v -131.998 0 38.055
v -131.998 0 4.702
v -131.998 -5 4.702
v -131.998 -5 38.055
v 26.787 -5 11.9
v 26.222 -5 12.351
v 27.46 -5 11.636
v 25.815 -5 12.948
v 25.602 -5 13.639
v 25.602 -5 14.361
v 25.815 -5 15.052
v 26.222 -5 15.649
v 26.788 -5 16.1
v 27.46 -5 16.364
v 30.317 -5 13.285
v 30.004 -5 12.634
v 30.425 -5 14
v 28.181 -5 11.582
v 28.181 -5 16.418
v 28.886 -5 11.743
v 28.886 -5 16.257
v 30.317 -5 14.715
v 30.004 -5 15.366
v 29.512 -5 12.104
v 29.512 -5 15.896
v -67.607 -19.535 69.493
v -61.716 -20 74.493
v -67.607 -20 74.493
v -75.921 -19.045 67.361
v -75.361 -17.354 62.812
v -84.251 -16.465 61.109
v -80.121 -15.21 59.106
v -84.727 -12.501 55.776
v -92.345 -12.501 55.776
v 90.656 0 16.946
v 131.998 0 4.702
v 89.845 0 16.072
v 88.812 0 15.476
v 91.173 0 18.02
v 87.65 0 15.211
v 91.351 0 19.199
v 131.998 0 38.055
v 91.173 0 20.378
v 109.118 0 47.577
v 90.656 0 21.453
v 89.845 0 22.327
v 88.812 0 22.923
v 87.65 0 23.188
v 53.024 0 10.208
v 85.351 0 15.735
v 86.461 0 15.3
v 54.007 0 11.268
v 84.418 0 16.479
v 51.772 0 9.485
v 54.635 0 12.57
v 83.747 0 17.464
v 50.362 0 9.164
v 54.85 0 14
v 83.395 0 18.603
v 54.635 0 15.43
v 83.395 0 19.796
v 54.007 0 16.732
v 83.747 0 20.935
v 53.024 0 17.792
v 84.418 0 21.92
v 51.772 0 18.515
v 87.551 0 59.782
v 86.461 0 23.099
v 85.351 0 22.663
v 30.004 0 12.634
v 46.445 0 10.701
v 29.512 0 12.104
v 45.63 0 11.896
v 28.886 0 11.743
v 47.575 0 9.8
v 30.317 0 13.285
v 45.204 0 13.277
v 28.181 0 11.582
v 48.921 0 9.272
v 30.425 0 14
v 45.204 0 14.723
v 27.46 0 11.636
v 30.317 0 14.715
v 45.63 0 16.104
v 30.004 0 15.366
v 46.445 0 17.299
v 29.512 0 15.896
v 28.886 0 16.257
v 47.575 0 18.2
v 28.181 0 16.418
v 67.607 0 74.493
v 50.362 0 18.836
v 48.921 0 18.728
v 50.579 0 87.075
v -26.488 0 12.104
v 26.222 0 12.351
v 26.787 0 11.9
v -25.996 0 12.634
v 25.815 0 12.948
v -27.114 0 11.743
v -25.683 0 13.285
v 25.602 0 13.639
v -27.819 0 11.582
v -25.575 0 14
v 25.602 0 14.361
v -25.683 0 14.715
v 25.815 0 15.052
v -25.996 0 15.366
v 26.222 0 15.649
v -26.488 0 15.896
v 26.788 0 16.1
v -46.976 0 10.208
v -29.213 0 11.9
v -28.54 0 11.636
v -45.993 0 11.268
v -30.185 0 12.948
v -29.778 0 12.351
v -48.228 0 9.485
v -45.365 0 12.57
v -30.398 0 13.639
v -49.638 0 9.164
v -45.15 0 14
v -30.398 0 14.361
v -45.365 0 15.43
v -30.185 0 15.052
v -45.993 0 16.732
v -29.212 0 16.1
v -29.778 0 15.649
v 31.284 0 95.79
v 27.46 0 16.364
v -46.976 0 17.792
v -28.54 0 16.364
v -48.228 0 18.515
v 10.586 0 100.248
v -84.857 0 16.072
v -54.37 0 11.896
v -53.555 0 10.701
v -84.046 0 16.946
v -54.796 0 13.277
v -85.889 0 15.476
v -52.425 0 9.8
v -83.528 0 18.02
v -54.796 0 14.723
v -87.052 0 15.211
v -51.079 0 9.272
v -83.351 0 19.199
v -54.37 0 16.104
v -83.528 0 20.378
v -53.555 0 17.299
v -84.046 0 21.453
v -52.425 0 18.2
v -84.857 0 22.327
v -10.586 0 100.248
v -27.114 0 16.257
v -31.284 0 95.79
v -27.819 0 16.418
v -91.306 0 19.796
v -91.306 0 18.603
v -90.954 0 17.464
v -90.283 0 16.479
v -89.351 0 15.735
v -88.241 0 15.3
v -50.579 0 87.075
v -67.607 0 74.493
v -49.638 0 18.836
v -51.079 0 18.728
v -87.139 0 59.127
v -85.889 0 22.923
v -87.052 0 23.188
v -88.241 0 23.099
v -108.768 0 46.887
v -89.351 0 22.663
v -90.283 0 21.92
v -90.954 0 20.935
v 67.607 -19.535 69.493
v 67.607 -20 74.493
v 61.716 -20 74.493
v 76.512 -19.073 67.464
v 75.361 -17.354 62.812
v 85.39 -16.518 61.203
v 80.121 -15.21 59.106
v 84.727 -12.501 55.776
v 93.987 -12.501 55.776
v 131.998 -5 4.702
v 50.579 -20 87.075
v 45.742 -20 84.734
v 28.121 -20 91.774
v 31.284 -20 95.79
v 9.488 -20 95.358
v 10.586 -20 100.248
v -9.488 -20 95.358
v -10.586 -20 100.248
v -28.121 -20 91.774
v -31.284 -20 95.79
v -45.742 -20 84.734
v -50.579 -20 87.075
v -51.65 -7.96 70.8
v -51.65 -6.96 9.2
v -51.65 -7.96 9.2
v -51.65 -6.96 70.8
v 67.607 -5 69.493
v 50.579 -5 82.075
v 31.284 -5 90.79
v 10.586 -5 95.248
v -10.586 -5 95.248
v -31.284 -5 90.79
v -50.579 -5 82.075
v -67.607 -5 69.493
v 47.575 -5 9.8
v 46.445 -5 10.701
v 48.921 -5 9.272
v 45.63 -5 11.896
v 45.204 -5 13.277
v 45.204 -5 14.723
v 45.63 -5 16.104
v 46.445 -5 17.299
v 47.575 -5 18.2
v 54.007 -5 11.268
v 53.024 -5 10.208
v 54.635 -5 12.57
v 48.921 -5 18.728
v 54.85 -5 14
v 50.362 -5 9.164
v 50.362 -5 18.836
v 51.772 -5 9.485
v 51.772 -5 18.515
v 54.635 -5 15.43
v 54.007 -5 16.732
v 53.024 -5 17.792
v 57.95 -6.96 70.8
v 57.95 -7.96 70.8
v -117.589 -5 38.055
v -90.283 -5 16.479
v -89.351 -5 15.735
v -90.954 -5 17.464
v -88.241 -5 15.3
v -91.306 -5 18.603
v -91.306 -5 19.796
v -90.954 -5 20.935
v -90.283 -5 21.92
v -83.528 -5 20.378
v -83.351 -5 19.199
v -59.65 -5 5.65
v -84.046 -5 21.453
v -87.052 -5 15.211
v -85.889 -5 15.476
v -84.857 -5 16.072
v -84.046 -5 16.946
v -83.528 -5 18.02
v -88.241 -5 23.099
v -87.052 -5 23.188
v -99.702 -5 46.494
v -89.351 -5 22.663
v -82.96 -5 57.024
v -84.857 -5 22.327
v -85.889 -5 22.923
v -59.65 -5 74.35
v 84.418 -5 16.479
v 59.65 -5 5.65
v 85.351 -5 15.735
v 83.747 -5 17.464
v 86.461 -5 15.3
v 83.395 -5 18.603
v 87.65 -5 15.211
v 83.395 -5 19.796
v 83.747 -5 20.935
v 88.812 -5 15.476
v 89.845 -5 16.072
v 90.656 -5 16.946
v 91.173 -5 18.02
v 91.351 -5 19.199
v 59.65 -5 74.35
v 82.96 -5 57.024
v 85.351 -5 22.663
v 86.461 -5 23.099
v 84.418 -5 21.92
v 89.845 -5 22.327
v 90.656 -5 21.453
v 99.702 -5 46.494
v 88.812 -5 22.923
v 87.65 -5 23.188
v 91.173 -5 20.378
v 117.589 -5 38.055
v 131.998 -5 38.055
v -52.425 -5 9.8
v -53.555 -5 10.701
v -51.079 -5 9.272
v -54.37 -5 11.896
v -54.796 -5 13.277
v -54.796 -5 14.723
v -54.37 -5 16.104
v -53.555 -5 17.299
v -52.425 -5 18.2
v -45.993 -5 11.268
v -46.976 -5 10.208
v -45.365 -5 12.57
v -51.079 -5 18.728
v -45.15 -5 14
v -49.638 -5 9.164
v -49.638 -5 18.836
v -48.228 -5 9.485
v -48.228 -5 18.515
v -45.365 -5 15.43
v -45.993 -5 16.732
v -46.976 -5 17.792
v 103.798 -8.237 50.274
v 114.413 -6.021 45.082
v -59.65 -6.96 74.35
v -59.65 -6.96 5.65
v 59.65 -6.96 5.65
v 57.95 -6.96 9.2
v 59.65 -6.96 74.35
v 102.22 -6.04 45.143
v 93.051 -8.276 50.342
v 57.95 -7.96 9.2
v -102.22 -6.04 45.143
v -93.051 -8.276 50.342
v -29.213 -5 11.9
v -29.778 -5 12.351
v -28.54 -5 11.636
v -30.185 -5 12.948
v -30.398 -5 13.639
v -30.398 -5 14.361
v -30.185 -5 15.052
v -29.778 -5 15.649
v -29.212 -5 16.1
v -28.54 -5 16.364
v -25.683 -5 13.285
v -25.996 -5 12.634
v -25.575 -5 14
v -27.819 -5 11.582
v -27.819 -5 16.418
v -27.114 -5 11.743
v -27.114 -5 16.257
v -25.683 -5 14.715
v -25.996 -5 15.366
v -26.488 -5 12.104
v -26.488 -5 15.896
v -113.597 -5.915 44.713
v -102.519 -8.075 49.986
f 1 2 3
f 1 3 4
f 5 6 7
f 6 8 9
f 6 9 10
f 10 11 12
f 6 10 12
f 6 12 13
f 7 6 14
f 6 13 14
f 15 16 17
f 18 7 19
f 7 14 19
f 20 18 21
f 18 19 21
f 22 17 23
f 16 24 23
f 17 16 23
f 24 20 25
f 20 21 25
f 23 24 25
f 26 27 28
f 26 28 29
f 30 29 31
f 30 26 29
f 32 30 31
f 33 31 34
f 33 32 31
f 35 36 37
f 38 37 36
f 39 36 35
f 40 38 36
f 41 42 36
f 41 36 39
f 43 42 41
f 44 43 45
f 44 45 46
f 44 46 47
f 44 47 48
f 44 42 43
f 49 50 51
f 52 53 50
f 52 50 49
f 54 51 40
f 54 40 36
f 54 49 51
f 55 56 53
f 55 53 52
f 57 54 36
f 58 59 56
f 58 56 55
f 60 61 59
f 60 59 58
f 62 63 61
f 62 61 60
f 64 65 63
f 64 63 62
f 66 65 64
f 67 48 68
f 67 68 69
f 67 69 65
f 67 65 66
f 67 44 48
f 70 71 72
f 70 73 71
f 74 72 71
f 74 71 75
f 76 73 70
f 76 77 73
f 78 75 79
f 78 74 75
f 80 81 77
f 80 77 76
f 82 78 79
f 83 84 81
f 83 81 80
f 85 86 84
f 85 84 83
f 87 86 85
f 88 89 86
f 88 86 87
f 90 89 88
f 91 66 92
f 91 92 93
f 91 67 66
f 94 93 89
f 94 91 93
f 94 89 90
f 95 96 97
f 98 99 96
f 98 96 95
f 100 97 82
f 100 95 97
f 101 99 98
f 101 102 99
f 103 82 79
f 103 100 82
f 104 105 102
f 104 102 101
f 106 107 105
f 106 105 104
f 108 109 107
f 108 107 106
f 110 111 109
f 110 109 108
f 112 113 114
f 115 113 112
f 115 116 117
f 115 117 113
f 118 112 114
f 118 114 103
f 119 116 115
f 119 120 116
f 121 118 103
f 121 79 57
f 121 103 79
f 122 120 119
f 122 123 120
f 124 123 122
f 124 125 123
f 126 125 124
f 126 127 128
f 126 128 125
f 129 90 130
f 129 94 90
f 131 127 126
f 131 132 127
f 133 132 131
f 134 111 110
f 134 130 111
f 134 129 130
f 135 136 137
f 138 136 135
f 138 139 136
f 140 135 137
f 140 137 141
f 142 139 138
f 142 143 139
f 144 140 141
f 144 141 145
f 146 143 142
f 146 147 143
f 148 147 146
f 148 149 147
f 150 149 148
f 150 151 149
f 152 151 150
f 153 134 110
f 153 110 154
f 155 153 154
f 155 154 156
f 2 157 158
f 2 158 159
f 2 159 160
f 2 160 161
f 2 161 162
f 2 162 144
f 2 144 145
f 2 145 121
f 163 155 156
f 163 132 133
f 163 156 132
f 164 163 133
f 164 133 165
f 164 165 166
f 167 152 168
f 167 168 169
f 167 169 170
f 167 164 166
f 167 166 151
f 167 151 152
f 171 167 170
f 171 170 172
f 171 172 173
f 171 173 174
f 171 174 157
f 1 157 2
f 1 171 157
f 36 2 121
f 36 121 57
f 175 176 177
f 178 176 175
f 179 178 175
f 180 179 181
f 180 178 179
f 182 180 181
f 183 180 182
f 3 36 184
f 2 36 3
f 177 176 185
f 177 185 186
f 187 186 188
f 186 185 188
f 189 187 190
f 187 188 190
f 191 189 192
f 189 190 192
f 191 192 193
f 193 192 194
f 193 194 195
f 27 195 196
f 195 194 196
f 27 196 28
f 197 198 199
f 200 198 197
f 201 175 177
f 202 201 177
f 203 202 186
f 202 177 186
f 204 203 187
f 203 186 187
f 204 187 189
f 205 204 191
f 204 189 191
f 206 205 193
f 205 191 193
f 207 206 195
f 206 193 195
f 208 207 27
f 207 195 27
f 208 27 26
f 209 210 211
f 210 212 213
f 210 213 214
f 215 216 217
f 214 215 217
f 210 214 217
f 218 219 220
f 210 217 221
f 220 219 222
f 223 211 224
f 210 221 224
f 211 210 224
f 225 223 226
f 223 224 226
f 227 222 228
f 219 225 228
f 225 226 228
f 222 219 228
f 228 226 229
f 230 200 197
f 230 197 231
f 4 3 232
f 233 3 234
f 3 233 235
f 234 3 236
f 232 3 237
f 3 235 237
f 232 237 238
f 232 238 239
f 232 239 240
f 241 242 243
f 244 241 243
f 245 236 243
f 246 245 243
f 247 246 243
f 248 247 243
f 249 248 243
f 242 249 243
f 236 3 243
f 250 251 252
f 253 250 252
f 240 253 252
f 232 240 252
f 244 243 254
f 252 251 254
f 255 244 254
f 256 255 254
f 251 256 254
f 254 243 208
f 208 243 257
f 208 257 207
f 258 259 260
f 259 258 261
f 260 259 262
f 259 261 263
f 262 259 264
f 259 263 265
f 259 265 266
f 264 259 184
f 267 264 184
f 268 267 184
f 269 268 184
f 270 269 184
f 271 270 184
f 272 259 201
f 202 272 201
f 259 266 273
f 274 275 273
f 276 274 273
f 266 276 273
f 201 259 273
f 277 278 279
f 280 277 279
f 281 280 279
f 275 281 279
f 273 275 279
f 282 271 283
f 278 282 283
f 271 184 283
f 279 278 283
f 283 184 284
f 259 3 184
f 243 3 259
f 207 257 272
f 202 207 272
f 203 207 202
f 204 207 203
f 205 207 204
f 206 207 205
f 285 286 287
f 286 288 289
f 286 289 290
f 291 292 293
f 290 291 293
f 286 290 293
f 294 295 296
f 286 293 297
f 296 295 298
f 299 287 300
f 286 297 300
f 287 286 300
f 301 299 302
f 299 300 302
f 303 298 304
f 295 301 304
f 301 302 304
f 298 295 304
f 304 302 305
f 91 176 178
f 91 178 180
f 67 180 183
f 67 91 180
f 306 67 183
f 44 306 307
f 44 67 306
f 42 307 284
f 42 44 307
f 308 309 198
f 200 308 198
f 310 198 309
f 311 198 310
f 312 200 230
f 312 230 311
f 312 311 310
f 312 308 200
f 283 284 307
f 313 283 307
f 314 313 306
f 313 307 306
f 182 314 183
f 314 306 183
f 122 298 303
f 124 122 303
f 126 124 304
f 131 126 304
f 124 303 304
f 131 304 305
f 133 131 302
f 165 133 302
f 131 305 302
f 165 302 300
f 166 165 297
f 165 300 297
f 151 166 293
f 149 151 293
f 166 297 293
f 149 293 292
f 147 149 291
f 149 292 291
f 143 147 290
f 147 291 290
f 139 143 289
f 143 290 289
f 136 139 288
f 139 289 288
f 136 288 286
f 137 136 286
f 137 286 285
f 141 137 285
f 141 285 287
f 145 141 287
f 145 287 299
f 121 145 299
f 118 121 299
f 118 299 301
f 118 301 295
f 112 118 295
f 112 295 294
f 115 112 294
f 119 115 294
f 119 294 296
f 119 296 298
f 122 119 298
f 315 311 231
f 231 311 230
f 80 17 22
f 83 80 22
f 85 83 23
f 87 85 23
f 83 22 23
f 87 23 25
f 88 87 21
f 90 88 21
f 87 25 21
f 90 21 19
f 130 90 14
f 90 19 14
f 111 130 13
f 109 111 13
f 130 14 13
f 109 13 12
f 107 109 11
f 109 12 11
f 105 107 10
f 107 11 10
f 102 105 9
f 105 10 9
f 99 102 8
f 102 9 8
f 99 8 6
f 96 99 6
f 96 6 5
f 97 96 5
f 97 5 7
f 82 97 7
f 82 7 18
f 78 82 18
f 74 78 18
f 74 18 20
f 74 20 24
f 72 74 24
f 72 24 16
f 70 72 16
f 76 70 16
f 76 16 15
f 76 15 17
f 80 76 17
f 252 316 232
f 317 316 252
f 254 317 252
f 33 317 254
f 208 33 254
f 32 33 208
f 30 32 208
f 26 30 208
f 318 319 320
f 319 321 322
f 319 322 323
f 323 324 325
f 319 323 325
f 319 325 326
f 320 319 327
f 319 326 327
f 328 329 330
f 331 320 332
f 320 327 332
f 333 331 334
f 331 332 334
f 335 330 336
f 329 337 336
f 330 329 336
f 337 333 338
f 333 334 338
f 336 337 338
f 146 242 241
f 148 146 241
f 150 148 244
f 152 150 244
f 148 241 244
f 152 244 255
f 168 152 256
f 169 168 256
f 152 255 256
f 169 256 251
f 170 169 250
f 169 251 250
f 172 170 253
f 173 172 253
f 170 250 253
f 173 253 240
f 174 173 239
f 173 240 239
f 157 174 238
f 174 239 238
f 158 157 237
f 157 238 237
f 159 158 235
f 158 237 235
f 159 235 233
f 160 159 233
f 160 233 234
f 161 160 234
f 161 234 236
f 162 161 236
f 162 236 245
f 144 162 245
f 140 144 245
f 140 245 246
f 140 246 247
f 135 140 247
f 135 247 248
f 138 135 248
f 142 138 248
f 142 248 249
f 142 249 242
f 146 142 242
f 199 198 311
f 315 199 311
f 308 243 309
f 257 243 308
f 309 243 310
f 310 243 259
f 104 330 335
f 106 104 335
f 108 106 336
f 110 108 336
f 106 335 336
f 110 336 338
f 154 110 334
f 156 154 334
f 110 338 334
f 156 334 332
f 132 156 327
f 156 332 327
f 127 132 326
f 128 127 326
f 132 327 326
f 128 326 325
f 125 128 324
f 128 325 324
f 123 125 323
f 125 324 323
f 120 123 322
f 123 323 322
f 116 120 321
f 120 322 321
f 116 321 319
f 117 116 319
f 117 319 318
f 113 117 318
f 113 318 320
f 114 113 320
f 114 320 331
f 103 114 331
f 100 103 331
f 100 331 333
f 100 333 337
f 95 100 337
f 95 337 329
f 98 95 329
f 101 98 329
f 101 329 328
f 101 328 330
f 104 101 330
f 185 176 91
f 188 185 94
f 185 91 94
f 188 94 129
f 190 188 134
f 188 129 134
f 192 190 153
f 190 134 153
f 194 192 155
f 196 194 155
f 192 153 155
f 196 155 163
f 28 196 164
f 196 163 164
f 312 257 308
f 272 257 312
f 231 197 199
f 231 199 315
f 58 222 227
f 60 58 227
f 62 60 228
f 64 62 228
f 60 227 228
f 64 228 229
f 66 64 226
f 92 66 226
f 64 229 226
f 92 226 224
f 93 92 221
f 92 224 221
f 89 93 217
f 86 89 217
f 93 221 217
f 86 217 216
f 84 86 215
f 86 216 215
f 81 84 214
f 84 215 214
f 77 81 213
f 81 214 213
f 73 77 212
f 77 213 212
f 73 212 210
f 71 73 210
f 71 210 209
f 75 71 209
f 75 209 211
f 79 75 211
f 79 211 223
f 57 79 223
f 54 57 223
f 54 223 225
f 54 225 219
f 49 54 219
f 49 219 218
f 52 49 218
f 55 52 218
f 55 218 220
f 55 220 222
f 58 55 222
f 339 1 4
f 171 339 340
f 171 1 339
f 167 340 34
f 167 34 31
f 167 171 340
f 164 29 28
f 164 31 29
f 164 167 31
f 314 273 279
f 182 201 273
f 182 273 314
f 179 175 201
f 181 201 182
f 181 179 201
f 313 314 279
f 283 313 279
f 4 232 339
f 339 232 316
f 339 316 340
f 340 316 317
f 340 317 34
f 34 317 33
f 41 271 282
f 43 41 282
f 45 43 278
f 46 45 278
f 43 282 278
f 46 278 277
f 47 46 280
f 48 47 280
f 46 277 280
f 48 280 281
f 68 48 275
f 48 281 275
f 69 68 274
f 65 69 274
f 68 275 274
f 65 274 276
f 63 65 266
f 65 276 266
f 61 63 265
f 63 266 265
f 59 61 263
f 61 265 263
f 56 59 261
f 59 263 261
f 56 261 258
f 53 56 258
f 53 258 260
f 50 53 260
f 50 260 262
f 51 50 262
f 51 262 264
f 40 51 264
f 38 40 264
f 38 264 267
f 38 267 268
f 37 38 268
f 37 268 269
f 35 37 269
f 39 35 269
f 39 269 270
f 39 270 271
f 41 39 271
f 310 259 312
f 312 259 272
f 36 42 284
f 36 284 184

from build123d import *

# Parameters (mm, degrees)
PAD_DEPTH       = 20
POCKET_DEPTH    = 15
POCKET001_DEPTH = 263.99865
SKETCH014_R     = 4.85
SKETCH014_R_2   = 2.425
SKETCH014_R_3   = 4
POCKET002_DEPTH = 5.001
SKETCH002_W     = 119.3
SKETCH002_H     = 68.7
PAD001_DEPTH    = 1.96
SKETCH003_W     = 109.6
SKETCH003_H     = 61.6
PAD002_DEPTH    = 1


with BuildPart() as part:
    # Sketch → Pad (new body)
    with BuildSketch(Plane.XZ):
        with BuildLine():
            ThreePointArc((-131.99765, 38.055004), (-97.721492, 52.596551), (-67.607356, 74.492906))
            ThreePointArc((67.607356, 74.492906), (0, 100.809493), (-67.607356, 74.492906))
            ThreePointArc((67.607356, 74.492906), (98.150505, 53.35467), (131.99765, 38.055004))
            Line((131.99765, 38.055004), (131.99765, 4.702024))
            Line((131.99765, 4.702024), (-131.99765, 4.702024))
            Line((-131.99765, 4.702024), (-131.99765, 38.055004))
        make_face()
    extrude(amount=PAD_DEPTH)

    # Sketch012 → Pocket (cut)
    with BuildSketch(Plane.XZ.offset(20)):
        with BuildLine():
            Line((-126.99765, -34.311944), (126.99765, -34.311944))
            Line((126.99765, -34.311944), (126.99765, 34.620733))
            ThreePointArc((67.607356, 69.492906), (95.451831, 48.904968), (126.99765, 34.620733))
            ThreePointArc((67.607356, 69.492906), (0, 95.809493), (-67.607356, 69.492906))
            ThreePointArc((-126.99765, 34.620733), (-95.451831, 48.904968), (-67.607356, 69.492906))
            Line((-126.99765, -34.311944), (-126.99765, 34.620733))
        make_face()
    extrude(amount=-POCKET_DEPTH, mode=Mode.SUBTRACT)

    # Sketch013 → Pocket001 (cut, through all)
    with BuildSketch(Plane.YZ.offset(132)):
        with BuildLine():
            Line((-20, 4.702024), (-5, 4.702024))
            Line((-5, 4.702024), (-5, 38.055004))
            ThreePointArc((-5, 38.055004), (-6.952423, 47.67633), (-12.500816, 55.77554))
            ThreePointArc((-20, 74.492906), (-18.05546, 64.411022), (-12.500816, 55.77554))
            Line((-20, 4.702024), (-20, 74.492906))
        make_face()
    extrude(amount=-POCKET001_DEPTH, mode=Mode.SUBTRACT)

    # Sketch014 → Pocket002 (cut, through all)
    with BuildSketch(Plane.XZ.offset(5)):
        with Locations((-50, 14)):
            Circle(SKETCH014_R)
        with Locations((-28, 14)):
            Circle(SKETCH014_R_2)
        with Locations((28, 14)):
            Circle(SKETCH014_R_2)
        with Locations((50, 14)):
            Circle(SKETCH014_R)
        with Locations((-87.350586, 19.199383)):
            Circle(SKETCH014_R_3)
        with Locations((87.350586, 19.199383)):
            Circle(SKETCH014_R_3)
    extrude(amount=-POCKET002_DEPTH, mode=Mode.SUBTRACT)

    # Sketch002 → Pad001 (join)
    with BuildSketch(Plane(origin=(0, -5, 40), x_dir=(1, 0, 0), z_dir=(0, -1, 0))):
        Rectangle(SKETCH002_W, SKETCH002_H)
    extrude(amount=PAD001_DEPTH)

    # Sketch003 → Pad002 (join)
    with BuildSketch(Plane(origin=(0, -6.96, 40), x_dir=(1, 0, 0), z_dir=(0, -1, 0))):
        with Locations((3.15, 0)):
            Rectangle(SKETCH003_W, SKETCH003_H)
    extrude(amount=PAD002_DEPTH)


solid = part.part
